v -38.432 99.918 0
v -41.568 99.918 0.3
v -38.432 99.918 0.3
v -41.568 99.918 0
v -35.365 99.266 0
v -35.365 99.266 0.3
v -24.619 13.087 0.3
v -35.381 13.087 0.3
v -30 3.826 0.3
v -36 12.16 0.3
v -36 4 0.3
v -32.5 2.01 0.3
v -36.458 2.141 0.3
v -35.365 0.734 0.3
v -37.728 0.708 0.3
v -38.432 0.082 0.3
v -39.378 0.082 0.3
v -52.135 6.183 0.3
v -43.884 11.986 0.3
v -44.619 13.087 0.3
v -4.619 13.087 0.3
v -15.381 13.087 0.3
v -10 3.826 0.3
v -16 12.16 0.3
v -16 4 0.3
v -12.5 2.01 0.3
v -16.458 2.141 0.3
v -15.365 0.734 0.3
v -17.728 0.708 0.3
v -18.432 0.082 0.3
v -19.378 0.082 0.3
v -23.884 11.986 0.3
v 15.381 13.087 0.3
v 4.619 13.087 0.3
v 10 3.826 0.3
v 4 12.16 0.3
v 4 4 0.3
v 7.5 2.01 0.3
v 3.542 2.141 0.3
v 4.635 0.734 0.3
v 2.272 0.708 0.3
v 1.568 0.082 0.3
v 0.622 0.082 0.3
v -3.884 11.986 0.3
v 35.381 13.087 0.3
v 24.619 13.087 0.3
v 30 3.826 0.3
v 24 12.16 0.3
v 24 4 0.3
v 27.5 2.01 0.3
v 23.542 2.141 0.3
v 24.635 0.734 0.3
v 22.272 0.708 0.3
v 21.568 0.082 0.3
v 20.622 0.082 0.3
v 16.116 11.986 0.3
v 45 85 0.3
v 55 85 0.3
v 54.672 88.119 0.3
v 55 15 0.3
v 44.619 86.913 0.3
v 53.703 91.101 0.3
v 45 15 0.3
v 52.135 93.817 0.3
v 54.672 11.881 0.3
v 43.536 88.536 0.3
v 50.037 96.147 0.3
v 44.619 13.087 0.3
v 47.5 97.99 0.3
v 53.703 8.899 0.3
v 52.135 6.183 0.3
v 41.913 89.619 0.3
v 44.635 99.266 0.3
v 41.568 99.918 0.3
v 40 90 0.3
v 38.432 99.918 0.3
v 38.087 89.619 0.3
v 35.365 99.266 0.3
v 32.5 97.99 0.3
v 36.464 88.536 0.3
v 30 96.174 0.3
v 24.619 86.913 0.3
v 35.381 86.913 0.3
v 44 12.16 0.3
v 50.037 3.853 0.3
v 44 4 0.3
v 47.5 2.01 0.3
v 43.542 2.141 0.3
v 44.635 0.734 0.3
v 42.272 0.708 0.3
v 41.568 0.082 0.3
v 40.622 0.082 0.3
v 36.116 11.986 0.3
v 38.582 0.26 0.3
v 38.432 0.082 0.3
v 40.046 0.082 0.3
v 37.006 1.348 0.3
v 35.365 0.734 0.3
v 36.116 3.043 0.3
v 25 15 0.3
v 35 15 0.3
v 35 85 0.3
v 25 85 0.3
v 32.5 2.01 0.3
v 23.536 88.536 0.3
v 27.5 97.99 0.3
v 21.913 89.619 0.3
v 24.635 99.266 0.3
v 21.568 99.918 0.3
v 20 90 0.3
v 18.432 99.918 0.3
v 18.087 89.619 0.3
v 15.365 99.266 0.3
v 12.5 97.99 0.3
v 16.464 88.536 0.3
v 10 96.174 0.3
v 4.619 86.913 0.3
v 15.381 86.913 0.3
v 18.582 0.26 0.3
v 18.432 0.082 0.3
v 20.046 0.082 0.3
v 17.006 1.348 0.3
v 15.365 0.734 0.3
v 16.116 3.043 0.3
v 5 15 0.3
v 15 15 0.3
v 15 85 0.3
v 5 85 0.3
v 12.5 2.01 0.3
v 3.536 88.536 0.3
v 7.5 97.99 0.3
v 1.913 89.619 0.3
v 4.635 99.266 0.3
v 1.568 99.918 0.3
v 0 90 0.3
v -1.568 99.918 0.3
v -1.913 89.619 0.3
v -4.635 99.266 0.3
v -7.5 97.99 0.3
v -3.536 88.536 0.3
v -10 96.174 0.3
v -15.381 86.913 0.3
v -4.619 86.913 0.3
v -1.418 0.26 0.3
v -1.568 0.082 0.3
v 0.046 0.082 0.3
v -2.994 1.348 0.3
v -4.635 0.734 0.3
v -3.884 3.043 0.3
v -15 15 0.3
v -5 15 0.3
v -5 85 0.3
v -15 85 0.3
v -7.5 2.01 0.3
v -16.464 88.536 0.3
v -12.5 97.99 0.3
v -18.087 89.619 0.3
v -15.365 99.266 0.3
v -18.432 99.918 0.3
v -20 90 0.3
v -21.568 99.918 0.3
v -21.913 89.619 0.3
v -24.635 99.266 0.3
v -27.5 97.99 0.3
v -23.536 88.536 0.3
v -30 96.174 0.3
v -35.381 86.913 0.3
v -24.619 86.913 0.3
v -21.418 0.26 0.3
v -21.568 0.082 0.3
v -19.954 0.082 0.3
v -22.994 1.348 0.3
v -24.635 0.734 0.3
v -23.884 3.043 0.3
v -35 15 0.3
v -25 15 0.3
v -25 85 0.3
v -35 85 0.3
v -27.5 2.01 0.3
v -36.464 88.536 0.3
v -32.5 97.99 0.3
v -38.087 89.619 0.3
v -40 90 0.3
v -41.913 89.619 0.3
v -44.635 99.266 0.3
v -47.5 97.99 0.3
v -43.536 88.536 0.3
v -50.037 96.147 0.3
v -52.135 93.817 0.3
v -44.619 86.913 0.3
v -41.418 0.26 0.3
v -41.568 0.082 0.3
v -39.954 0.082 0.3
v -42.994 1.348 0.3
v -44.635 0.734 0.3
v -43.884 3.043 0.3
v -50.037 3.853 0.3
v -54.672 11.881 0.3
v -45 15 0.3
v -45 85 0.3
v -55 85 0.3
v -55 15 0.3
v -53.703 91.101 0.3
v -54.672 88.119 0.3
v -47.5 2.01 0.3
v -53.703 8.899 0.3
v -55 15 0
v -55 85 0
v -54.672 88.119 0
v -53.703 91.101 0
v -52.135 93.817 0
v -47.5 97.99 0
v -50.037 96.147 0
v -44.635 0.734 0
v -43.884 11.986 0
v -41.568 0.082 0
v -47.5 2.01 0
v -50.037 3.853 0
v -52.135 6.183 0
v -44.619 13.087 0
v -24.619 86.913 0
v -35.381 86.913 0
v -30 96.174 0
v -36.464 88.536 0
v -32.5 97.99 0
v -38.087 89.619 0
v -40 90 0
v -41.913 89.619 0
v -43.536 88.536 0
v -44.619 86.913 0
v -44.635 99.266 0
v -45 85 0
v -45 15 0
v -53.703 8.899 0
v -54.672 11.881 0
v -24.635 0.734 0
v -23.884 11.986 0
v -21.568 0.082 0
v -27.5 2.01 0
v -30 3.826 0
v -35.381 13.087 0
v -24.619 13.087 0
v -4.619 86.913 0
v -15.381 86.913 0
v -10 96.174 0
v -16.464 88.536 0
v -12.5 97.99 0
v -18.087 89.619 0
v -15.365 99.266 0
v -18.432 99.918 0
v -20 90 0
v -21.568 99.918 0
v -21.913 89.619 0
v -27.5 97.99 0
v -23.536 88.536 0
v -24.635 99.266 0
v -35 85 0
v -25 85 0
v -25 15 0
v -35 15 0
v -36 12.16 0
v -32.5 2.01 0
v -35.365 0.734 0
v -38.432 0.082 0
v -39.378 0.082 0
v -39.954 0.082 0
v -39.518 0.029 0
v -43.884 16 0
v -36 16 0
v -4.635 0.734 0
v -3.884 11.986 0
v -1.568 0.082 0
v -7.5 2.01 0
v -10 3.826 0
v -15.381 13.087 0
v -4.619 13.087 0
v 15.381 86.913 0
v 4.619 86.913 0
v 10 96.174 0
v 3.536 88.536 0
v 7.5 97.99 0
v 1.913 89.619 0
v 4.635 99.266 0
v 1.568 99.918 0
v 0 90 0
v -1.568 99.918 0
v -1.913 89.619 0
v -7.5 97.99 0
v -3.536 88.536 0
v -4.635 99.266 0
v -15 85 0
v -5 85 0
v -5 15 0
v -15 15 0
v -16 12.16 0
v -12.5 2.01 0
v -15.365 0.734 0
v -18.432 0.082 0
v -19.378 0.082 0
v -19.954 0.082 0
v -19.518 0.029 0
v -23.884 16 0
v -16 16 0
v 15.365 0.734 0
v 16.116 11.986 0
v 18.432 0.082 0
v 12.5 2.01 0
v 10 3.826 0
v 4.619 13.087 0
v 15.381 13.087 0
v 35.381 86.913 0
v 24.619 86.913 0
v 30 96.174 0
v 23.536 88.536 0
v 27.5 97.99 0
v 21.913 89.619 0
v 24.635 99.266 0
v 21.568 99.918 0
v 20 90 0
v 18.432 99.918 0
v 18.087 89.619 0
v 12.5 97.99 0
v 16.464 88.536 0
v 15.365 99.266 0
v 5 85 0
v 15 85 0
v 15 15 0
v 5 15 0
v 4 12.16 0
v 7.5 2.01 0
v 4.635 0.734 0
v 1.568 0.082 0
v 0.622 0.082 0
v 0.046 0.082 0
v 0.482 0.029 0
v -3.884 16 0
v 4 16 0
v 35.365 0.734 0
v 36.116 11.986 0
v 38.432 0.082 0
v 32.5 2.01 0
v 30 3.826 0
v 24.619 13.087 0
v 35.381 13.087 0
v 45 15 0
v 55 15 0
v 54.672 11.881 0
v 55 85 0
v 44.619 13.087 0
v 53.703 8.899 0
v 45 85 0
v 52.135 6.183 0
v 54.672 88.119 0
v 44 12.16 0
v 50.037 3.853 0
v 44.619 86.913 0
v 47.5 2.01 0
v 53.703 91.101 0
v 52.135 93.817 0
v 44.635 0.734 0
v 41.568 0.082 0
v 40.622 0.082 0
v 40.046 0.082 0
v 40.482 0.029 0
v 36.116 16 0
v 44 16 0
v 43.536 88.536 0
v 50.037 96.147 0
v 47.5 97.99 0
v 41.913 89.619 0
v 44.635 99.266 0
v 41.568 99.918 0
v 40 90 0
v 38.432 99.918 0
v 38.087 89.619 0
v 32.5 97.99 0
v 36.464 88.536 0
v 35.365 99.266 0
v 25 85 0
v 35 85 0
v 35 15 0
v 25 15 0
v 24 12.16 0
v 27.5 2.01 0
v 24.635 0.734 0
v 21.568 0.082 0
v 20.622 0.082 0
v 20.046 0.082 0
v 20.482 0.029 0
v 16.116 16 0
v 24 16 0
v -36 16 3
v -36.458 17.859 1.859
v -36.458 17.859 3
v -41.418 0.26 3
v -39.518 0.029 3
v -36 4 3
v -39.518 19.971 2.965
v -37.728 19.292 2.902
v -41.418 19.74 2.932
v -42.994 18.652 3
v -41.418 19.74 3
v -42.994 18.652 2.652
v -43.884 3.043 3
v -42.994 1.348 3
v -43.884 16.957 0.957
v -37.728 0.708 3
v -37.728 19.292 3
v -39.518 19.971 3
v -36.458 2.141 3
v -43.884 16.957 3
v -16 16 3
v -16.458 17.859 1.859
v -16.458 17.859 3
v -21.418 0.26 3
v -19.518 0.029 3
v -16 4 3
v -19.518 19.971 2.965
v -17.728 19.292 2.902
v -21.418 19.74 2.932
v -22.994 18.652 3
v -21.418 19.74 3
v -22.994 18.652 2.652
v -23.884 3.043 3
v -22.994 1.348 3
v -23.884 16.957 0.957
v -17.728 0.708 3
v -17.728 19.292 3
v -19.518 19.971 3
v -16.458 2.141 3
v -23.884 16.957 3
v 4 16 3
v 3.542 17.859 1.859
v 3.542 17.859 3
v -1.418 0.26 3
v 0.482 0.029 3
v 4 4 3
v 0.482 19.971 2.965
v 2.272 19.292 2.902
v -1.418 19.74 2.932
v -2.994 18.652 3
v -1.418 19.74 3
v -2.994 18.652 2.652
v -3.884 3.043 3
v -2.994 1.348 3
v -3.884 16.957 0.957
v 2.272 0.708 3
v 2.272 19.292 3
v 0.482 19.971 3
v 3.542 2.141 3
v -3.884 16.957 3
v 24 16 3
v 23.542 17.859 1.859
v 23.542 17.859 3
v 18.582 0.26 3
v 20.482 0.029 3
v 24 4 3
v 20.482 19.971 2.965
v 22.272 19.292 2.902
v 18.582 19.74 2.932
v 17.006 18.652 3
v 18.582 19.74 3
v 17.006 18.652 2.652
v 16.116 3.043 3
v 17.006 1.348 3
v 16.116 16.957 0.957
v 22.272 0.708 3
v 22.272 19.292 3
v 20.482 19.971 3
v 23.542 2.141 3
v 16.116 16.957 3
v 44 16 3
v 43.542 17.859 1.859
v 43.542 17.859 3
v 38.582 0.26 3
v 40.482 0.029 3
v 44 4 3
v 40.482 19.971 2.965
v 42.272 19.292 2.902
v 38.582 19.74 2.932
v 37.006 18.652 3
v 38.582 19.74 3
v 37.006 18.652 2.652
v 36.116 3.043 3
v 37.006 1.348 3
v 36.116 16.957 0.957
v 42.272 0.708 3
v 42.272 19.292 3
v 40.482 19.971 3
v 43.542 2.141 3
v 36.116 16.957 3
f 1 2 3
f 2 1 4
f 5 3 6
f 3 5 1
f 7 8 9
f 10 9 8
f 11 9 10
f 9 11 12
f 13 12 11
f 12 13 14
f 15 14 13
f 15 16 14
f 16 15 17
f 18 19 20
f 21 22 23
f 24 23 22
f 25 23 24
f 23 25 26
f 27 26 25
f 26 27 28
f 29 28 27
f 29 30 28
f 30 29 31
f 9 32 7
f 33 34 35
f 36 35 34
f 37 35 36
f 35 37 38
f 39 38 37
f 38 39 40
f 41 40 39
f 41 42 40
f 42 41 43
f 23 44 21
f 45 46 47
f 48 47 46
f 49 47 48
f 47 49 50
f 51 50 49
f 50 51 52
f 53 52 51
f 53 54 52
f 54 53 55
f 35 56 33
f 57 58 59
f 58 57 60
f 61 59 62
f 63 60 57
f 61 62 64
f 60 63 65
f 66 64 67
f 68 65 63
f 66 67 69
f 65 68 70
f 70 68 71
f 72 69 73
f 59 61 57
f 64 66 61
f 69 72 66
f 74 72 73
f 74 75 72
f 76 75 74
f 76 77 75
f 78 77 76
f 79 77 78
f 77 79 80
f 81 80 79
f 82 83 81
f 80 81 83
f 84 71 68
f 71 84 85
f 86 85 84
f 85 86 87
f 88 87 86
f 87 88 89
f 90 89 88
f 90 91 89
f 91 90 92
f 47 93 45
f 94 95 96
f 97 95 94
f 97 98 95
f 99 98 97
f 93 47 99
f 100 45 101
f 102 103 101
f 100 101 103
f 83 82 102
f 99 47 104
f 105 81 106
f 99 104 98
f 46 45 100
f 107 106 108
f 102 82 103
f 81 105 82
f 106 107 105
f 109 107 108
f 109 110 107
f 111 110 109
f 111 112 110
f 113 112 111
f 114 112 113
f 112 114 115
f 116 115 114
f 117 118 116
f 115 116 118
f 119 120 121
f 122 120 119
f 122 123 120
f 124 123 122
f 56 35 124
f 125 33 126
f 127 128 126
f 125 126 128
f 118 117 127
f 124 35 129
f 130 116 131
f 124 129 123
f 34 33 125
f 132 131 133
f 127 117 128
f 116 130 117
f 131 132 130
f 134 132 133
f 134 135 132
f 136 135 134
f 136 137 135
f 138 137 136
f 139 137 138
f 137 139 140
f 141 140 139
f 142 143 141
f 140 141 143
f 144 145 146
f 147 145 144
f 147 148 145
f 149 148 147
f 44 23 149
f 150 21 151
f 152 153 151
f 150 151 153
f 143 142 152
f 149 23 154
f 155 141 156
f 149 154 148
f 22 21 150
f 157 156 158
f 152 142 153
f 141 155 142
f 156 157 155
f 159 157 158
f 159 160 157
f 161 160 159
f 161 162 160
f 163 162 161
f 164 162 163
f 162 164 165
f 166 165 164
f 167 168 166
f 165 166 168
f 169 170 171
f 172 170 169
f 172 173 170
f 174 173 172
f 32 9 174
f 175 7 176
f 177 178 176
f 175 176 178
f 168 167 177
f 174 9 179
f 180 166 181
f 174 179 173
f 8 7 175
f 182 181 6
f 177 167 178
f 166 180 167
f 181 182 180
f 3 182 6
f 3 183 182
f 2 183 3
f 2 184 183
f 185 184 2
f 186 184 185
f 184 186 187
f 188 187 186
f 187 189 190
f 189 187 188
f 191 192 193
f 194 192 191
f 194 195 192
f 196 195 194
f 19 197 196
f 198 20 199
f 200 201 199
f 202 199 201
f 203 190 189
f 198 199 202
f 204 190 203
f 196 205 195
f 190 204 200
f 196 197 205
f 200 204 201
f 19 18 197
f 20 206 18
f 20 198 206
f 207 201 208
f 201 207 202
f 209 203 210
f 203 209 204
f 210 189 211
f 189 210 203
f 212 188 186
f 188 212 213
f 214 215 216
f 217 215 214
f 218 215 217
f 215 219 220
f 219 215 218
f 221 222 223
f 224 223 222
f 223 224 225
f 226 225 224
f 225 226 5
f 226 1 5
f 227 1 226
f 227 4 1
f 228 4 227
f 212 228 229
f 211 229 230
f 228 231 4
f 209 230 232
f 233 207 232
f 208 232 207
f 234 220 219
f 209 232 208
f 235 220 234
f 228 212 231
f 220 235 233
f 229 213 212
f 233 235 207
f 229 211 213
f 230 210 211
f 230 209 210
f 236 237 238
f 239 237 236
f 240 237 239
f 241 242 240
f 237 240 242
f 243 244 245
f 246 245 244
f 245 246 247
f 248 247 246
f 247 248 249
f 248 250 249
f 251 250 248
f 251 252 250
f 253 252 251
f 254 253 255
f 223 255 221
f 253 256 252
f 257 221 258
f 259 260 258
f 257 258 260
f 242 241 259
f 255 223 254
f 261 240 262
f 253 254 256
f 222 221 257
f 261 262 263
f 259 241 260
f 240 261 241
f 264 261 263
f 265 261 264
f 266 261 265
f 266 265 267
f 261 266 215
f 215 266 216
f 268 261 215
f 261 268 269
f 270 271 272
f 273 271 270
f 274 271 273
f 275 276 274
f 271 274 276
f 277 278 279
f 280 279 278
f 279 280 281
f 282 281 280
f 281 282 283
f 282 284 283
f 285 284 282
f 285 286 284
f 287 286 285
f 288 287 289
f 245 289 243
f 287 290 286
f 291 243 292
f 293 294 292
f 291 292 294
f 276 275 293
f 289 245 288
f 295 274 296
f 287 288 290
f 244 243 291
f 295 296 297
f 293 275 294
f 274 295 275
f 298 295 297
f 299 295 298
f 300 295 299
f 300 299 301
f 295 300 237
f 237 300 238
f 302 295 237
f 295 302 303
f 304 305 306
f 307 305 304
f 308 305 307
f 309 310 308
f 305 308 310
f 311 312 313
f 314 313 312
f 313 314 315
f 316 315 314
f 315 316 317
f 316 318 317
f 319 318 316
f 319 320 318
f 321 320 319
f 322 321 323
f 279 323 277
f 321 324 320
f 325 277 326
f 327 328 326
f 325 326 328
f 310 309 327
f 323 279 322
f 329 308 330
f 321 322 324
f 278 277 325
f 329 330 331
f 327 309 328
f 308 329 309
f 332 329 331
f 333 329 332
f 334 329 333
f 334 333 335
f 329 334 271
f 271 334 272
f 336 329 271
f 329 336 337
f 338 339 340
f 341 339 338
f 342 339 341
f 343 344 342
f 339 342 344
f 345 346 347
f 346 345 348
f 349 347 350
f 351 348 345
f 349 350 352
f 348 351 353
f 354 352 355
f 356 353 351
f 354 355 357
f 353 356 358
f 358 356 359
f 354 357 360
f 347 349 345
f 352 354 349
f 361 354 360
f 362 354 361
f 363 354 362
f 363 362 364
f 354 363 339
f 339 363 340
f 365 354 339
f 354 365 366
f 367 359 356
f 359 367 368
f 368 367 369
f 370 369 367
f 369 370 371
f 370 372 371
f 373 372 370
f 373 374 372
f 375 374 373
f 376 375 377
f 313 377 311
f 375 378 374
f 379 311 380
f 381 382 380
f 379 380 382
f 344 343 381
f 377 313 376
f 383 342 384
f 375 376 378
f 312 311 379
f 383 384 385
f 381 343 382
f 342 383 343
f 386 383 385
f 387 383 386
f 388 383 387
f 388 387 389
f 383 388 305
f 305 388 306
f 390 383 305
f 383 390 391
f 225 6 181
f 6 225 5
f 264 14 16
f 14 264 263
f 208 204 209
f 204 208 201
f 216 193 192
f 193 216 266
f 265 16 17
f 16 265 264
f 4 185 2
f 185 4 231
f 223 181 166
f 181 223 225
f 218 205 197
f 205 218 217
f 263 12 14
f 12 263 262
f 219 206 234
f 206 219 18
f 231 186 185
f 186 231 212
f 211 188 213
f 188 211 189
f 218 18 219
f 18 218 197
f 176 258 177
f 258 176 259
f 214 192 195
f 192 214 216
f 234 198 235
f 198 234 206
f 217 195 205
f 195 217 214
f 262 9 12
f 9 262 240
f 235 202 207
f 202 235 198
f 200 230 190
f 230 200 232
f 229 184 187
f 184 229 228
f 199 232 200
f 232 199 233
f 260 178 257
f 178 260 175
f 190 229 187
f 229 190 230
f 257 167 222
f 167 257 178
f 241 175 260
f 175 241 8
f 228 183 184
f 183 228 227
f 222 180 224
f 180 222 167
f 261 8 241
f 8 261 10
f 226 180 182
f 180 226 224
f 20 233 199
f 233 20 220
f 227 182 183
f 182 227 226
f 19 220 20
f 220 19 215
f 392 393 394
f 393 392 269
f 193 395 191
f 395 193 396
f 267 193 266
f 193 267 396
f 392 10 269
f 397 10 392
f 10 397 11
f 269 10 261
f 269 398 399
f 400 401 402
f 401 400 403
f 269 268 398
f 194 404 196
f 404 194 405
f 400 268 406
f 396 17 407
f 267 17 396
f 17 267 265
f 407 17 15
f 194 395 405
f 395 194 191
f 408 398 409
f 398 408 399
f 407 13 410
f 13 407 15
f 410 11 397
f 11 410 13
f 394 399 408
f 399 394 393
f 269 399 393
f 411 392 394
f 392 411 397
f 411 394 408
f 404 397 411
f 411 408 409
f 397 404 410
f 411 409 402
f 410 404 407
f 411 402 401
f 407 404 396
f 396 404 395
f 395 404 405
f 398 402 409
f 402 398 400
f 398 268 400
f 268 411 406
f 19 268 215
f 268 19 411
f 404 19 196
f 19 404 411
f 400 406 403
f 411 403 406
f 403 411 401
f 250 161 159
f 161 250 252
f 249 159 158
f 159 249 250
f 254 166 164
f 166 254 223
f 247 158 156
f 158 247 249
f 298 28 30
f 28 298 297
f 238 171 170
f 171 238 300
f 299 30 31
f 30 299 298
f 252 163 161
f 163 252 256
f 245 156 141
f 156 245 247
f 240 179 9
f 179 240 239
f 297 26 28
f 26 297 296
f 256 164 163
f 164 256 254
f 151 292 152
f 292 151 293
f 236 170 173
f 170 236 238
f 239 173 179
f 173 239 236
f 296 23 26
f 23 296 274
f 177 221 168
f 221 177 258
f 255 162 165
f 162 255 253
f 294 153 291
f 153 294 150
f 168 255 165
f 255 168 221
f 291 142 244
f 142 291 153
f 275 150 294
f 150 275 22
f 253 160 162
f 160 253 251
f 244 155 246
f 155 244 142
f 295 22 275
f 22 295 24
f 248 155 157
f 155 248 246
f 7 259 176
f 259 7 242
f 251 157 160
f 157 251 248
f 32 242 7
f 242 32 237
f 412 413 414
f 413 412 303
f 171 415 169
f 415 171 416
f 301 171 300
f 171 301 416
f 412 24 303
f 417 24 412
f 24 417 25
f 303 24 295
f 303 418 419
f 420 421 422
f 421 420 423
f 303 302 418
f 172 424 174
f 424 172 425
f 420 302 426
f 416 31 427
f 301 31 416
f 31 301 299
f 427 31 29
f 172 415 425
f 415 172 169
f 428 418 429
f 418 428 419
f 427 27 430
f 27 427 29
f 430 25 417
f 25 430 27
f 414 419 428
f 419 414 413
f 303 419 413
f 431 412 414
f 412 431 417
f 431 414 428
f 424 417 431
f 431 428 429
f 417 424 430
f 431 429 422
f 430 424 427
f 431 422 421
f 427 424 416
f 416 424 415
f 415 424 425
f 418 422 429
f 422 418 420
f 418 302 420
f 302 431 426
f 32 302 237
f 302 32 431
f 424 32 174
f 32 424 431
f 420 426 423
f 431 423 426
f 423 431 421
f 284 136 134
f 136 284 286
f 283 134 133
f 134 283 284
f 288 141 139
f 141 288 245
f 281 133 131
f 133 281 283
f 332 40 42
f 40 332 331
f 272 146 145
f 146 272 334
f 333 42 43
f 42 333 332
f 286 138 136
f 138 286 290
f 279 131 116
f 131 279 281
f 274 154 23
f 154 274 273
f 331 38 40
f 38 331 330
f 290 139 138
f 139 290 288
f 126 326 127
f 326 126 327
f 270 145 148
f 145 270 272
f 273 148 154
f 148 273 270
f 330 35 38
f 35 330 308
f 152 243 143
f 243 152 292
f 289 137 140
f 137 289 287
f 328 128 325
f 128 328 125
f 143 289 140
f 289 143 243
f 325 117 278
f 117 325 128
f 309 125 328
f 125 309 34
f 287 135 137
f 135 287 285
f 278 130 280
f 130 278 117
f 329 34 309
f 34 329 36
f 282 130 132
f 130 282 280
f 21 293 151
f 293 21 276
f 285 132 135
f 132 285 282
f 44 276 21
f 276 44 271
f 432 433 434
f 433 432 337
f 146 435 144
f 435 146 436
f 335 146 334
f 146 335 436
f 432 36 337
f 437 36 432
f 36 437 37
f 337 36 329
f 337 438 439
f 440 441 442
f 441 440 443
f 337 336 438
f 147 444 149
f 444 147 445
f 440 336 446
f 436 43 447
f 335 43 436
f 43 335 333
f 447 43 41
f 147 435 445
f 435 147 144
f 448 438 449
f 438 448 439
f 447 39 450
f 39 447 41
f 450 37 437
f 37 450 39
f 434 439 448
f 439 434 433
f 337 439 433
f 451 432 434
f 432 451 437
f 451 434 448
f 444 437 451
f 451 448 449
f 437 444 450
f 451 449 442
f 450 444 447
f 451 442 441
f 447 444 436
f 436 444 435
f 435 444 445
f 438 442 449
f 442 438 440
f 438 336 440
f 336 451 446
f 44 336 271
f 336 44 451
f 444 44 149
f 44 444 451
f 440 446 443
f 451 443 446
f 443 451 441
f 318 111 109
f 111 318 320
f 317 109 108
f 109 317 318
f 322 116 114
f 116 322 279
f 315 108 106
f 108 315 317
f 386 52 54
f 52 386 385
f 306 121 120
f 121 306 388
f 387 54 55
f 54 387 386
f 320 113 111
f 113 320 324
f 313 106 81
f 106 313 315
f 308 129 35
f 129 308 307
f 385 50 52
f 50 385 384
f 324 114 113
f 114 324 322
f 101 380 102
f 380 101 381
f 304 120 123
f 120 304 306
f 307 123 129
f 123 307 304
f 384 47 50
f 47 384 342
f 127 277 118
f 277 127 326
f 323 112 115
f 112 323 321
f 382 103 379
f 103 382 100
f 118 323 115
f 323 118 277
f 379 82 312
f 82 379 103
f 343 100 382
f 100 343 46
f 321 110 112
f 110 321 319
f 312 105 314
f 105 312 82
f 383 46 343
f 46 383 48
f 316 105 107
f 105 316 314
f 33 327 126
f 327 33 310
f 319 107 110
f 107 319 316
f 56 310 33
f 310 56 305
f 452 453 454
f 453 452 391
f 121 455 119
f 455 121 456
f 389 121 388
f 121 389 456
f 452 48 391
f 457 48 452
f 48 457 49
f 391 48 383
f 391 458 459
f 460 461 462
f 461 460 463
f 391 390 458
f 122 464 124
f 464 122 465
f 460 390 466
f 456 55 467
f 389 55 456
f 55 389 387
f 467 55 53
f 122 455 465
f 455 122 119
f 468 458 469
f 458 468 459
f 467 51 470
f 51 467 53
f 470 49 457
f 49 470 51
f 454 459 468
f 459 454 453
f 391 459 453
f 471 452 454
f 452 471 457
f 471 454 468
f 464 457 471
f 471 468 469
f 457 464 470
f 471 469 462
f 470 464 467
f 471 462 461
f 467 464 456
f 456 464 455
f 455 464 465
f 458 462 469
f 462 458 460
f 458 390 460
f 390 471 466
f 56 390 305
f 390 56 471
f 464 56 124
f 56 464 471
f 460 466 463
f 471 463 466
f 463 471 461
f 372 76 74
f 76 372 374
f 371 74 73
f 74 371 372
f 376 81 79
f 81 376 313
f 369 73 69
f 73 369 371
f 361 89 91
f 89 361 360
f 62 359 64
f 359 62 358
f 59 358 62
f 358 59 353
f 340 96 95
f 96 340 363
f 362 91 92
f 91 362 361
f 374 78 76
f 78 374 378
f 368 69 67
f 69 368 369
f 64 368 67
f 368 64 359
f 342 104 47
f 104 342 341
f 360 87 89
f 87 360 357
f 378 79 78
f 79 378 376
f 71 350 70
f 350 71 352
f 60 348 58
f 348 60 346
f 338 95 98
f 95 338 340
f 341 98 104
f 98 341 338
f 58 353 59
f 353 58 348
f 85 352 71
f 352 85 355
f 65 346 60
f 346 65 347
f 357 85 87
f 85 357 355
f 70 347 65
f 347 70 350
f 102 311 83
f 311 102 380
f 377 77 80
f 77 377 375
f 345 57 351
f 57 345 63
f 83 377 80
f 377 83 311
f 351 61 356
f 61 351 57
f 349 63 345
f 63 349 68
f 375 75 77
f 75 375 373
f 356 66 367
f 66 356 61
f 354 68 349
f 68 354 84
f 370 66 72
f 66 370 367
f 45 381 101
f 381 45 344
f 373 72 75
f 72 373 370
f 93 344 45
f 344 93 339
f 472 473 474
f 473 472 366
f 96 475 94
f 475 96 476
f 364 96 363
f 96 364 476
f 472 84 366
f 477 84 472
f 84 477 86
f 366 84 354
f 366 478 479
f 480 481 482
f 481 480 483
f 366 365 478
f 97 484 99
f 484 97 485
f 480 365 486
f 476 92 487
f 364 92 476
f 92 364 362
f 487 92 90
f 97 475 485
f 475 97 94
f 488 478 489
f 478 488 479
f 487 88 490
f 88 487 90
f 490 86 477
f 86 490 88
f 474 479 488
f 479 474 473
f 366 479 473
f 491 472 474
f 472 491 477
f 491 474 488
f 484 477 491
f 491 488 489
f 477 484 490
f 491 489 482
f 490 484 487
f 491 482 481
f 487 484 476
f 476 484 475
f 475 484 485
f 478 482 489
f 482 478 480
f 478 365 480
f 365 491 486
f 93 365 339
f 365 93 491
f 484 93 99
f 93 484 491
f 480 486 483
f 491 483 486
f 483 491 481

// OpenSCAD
space_width = 10;
strip_width = 10;
strip_length = 100;
t1 = 0.3;
t2 = 1;
t3 = 3;

spacing = 1;

lines = 4;

module line(){

    difference(){
        hull(){
        translate([0, space_width/2 + strip_width, 0]) cylinder(r=space_width/2 + strip_width, h=t1);
        

        translate([0, strip_length - space_width/2 - strip_width, 0]) cylinder(r=space_width/2 + strip_width, h=t1);
        }
        
        hull(){
            translate([0, space_width/2 + strip_width, -1]) cylinder(r=space_width/2, h=t1+2);

            translate([0, strip_length - space_width/2 - strip_width, -1]) cylinder(r=space_width/2, h=t1+2);
        }
        
    }


    color("blue") hull(){
        translate([0, strip_width/2 - spacing, 0]) cylinder(d=strip_width - spacing*2, h=t3);
        translate([0, strip_width + strip_width/2 + spacing, 0]) difference(){
            cylinder(d=strip_width - spacing*2, h=t3);
            rotate([-90-45, 0, 0]) cylinder(d=strip_width, h= t3);
        }
    }

}

for (i=[-lines/2:lines/2]){
    translate([i*(space_width + strip_width),0 , 0]) line();
}
